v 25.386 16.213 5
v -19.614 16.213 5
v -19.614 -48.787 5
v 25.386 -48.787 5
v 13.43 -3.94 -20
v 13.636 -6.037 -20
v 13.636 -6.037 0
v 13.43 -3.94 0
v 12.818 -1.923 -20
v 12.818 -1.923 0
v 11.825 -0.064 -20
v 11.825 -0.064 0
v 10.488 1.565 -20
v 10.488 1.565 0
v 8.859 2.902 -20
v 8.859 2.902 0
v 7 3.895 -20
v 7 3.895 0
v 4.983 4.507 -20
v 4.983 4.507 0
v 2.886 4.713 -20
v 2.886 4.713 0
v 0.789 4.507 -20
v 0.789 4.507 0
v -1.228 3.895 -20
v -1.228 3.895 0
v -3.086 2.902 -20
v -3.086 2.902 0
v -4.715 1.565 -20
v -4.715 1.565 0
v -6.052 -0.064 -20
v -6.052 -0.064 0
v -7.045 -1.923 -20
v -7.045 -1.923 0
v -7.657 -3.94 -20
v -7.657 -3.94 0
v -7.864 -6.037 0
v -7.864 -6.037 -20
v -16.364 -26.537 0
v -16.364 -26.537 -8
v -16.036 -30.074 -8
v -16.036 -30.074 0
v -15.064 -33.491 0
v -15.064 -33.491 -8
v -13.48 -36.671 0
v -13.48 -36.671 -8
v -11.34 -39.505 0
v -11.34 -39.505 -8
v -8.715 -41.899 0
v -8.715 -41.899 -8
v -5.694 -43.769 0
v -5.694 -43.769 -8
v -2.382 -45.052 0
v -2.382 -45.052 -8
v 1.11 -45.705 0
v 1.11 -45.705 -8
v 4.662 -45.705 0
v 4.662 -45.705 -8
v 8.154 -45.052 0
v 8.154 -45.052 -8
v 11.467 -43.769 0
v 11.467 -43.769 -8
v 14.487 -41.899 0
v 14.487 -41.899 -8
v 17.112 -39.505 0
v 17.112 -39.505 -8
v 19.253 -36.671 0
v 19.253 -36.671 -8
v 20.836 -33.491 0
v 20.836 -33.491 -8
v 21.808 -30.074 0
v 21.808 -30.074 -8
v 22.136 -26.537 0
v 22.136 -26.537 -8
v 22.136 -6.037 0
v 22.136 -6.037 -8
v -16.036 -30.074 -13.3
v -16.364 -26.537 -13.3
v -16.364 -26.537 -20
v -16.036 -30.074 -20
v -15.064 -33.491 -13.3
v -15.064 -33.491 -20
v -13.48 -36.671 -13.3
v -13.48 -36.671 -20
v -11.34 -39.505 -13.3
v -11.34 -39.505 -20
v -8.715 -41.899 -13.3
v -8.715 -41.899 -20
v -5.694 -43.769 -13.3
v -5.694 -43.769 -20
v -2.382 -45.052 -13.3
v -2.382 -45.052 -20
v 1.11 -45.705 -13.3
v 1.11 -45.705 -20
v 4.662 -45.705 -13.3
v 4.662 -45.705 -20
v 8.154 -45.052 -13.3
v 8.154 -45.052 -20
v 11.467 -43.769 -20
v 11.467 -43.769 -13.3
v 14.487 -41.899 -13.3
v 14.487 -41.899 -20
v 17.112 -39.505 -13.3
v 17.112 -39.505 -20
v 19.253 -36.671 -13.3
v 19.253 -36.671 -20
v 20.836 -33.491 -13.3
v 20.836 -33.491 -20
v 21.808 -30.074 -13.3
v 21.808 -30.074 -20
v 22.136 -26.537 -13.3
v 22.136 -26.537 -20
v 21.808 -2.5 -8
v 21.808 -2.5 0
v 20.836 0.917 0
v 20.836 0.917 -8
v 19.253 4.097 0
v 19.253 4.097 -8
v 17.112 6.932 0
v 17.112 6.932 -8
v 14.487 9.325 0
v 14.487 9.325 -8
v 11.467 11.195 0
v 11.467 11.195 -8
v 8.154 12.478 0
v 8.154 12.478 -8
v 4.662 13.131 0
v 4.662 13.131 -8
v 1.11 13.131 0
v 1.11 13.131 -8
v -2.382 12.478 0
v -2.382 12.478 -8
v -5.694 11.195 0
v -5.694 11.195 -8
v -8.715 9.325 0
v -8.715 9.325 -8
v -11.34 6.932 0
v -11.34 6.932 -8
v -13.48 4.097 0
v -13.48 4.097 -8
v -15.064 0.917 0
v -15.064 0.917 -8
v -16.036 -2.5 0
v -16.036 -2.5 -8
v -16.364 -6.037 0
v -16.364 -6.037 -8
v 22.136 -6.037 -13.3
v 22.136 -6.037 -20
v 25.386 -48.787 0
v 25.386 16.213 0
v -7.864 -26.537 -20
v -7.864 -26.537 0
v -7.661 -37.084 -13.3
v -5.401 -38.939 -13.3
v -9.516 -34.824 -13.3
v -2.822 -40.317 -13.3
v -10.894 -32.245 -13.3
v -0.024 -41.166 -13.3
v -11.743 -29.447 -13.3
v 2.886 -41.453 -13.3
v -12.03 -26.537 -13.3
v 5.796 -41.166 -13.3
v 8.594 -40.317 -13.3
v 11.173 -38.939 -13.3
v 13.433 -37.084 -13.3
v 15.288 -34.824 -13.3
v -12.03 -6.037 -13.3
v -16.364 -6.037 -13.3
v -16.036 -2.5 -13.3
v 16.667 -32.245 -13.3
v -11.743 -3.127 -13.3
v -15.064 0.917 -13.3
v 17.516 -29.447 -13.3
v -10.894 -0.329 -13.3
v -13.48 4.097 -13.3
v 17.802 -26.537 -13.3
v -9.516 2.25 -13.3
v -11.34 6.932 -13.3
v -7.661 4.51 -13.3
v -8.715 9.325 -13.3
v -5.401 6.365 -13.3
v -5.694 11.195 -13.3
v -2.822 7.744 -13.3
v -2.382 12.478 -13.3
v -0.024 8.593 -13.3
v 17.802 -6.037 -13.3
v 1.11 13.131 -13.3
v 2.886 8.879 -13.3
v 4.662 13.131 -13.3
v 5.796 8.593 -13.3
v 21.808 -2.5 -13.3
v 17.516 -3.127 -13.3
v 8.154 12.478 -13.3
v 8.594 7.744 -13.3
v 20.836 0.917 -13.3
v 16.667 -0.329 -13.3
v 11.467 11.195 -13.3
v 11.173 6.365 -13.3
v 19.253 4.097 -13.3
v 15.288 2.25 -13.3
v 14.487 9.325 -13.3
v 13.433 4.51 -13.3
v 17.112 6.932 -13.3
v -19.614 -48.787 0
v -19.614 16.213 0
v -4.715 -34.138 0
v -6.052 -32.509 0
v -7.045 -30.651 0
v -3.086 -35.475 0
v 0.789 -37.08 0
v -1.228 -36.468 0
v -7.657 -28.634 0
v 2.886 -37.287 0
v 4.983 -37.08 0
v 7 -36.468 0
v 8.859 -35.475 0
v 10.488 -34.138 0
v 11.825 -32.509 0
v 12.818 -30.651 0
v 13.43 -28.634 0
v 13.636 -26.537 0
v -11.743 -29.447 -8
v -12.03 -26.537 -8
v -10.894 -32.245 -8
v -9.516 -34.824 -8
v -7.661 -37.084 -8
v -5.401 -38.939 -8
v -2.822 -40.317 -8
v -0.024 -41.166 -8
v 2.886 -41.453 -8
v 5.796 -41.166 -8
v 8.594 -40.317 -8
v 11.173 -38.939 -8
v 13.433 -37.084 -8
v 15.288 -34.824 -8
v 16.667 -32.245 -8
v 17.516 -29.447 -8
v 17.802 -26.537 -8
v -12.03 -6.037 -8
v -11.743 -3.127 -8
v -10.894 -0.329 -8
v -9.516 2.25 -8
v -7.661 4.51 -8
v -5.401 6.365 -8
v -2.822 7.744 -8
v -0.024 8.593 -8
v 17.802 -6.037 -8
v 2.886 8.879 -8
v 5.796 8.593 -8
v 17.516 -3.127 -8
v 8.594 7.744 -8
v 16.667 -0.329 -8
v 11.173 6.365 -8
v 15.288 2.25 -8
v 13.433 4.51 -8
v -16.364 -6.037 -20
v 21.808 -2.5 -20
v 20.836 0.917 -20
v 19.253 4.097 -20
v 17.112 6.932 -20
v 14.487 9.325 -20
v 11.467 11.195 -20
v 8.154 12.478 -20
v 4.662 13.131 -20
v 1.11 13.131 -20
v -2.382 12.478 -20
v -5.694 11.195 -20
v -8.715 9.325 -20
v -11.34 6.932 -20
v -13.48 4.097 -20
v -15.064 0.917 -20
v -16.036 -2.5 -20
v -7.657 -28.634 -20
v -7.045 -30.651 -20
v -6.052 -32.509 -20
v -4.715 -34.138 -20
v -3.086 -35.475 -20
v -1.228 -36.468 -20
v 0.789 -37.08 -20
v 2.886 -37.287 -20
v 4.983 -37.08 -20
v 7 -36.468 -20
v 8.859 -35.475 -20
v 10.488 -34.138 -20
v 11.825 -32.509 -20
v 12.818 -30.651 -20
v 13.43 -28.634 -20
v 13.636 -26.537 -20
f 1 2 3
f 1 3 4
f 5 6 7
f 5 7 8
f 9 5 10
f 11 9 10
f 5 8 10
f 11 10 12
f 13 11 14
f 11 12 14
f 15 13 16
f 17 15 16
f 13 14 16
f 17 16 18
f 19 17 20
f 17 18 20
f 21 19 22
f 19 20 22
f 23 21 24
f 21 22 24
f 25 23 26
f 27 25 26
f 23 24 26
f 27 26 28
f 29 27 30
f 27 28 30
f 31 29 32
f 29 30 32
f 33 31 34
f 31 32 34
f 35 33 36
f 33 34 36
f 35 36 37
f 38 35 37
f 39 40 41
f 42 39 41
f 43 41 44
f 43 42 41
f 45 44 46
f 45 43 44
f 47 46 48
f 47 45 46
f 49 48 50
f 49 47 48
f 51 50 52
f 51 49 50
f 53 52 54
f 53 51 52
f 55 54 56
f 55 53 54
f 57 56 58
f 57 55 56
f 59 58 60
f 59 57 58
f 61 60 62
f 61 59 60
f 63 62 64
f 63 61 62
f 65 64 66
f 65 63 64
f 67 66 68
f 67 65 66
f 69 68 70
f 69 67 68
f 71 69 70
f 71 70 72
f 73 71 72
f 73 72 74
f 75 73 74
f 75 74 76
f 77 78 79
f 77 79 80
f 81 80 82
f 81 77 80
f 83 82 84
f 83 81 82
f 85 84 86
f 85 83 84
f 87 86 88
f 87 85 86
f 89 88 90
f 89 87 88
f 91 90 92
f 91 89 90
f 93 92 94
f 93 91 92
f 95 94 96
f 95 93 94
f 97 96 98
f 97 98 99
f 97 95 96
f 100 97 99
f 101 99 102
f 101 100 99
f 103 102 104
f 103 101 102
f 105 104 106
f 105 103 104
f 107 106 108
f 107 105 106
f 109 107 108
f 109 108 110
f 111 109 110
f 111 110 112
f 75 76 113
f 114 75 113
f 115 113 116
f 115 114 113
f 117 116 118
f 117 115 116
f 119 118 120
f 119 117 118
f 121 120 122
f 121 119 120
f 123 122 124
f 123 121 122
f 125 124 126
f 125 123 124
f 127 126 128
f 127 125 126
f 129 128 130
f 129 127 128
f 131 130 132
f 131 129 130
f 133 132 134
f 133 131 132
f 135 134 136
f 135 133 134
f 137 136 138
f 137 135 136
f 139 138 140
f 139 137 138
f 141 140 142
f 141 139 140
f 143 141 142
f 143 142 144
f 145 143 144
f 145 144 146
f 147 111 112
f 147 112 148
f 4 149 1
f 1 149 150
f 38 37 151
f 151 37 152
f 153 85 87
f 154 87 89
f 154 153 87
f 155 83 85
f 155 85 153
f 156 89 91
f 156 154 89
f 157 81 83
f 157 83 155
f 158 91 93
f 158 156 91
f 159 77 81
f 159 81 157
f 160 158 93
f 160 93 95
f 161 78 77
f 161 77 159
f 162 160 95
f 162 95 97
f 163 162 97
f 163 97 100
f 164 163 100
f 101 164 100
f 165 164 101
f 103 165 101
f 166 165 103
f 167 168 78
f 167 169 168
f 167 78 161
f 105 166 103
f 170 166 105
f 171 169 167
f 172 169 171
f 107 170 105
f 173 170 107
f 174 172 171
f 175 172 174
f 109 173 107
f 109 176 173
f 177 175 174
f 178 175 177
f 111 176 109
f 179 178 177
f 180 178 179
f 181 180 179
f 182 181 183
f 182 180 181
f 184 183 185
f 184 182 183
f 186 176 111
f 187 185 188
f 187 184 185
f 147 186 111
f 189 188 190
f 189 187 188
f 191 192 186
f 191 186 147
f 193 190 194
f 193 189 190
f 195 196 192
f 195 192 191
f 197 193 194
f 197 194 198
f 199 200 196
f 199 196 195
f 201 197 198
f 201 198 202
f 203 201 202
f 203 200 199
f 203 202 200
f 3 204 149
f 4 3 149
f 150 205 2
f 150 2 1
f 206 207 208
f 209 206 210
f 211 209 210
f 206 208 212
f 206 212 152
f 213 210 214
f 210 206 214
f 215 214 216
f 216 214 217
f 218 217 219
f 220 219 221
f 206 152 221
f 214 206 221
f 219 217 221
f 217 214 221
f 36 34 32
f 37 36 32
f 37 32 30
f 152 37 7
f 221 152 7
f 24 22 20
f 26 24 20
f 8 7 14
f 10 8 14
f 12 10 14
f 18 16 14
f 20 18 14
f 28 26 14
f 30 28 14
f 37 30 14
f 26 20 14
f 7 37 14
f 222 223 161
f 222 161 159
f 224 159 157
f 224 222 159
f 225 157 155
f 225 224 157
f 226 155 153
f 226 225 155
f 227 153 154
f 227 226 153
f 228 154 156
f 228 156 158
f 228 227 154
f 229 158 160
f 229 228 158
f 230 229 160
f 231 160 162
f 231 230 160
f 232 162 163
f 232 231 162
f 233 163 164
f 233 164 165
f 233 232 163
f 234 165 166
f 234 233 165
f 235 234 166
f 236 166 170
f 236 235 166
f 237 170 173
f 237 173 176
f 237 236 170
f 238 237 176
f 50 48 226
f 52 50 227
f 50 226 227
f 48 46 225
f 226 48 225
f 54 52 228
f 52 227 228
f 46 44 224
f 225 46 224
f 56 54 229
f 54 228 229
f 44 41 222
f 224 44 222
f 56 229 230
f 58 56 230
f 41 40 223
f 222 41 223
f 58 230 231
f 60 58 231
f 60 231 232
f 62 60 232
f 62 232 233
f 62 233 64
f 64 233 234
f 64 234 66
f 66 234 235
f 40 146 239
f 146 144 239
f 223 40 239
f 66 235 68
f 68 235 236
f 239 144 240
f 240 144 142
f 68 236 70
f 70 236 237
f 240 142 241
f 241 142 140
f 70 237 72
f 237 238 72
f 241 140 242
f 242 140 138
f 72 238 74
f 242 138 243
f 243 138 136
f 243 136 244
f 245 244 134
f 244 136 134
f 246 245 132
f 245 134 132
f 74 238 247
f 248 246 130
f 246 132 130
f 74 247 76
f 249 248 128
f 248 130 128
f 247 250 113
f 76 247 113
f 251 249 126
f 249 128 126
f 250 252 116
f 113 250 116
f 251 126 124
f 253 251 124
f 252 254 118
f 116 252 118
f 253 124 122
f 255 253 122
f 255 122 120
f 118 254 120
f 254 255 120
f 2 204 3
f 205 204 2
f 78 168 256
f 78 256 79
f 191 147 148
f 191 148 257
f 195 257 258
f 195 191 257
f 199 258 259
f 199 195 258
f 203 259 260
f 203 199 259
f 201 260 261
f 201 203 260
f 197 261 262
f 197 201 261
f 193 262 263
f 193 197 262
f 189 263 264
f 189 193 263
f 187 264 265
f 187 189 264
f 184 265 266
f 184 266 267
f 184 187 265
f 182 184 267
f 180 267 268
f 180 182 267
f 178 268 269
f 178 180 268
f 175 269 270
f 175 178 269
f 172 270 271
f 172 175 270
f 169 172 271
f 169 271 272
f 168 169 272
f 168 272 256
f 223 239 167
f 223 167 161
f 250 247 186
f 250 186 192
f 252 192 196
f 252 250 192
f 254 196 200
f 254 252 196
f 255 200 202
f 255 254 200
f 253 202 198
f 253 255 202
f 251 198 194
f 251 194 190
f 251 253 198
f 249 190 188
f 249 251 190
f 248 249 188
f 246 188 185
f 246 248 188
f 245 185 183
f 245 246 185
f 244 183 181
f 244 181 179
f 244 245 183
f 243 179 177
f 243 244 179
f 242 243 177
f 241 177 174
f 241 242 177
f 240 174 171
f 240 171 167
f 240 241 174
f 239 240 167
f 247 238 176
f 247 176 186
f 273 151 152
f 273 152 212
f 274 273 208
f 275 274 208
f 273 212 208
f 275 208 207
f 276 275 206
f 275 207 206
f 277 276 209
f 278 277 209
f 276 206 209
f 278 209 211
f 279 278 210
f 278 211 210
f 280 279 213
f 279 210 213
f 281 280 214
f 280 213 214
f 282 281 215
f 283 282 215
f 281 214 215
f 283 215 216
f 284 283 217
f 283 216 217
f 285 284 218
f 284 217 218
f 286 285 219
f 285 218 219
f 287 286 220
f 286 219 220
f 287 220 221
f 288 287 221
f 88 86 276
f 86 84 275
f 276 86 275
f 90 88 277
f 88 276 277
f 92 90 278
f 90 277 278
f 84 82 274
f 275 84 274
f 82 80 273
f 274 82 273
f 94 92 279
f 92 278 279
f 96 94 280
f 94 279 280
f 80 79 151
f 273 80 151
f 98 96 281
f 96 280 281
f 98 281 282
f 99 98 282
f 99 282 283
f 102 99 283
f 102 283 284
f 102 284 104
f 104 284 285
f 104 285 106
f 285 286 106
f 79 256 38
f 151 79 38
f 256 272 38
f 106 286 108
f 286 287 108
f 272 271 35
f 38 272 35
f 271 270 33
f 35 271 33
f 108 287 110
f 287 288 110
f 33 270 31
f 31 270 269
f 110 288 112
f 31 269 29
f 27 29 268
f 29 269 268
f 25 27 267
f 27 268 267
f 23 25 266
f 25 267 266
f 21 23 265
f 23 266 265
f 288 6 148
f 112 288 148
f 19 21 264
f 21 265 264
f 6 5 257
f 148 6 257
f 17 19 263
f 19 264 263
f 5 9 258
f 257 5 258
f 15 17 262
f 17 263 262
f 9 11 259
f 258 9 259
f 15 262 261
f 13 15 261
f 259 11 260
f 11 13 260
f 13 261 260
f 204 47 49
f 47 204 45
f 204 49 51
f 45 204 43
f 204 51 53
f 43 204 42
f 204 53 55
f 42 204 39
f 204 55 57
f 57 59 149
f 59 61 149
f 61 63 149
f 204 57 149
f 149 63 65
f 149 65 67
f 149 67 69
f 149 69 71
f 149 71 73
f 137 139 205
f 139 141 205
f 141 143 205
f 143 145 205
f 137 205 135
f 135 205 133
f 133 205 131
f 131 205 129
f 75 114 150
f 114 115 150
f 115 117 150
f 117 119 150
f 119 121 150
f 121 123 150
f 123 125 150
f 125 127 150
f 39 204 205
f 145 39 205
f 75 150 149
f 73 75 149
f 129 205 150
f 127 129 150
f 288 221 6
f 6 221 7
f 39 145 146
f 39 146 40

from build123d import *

# Parameters (mm, degrees)
SKETCH1_W           = 45
SKETCH1_H           = 65
BOSS_EXTRUDE1_DEPTH = 5
BOSS_EXTRUDE2_DEPTH = 20
BOSS_EXTRUDE3_DEPTH = 5.3


with BuildPart() as part:
    # Sketch1 → Boss-Extrude1 (new body)
    with BuildSketch(Plane.XY):
        with Locations((2.886207951, -16.286739239)):
            Rectangle(SKETCH1_W, SKETCH1_H)
    extrude(amount=BOSS_EXTRUDE1_DEPTH)

    # Sketch4 → Boss-Extrude2 (add)
    with BuildSketch(Plane(origin=(0, 0, 0), x_dir=(-1, 0, 0), z_dir=(0, 0, -1))):
        with BuildLine():
            Line((16.363792049, -6.036739239), (16.363792049, -26.536739239))
            ThreePointArc((16.363792049, -26.536739239), (-2.886207951, -45.786739239), (-22.136207951, -26.536739239))
            Line((-22.136207951, -26.536739239), (-22.136207951, -6.036739239))
            ThreePointArc((-22.136207951, -6.036739239), (-2.886207951, 13.213260761), (16.363792049, -6.036739239))
        make_face()
        with BuildLine():
            Line((7.863792049, -6.036739239), (7.863792049, -26.536739239))
            ThreePointArc((7.863792049, -26.536739239), (-2.886207951, -37.286739239), (-13.636207951, -26.536739239))
            Line((-13.636207951, -26.536739239), (-13.636207951, -6.036739239))
            ThreePointArc((-13.636207951, -6.036739239), (-2.886207951, 4.713260761), (7.863792049, -6.036739239))
        make_face(mode=Mode.SUBTRACT)
    extrude(amount=BOSS_EXTRUDE2_DEPTH)


with BuildPart() as body_2:
    # Sketch6 → Boss-Extrude3 (new body)
    with BuildSketch(Plane(origin=(0, 0, 0), x_dir=(-1, 0, 0), z_dir=(0, 0, -1))):
        with BuildLine():
            Line((16.363792049, -6.036739239), (16.363792049, -26.536739239))
            ThreePointArc((16.363792049, -26.536739239), (-2.886207951, -45.786739239), (-22.136207951, -26.536739239))
            Line((-22.136207951, -26.536739239), (-22.136207951, -6.036739239))
            ThreePointArc((-22.136207951, -6.036739239), (-2.886207951, 13.213260761), (16.363792049, -6.036739239))
        make_face()
        with BuildLine():
            Line((12.029792049, -6.036739239), (12.029792049, -26.536739239))
            ThreePointArc((12.029792049, -26.536739239), (-2.886207951, -41.452739239), (-17.802207951, -26.536739239))
            Line((-17.802207951, -26.536739239), (-17.802207951, -6.036739239))
            ThreePointArc((-17.802207951, -6.036739239), (-2.886207951, 8.879260761), (12.029792049, -6.036739239))
        make_face(mode=Mode.SUBTRACT)
    extrude(amount=BOSS_EXTRUDE3_DEPTH)


with BuildPart() as body_2_1:
    # Body-Move/Copy1: read off the stored shape, not the designer's step
    # Body-Move/Copy1: moved
    add(body_2.part.moved(Location((0, 0, -8))))


with BuildPart() as part_1:
    add(part.part)

    # Combine1: cut body 2
    add(body_2_1.part, mode=Mode.SUBTRACT)


solid = part_1.part
